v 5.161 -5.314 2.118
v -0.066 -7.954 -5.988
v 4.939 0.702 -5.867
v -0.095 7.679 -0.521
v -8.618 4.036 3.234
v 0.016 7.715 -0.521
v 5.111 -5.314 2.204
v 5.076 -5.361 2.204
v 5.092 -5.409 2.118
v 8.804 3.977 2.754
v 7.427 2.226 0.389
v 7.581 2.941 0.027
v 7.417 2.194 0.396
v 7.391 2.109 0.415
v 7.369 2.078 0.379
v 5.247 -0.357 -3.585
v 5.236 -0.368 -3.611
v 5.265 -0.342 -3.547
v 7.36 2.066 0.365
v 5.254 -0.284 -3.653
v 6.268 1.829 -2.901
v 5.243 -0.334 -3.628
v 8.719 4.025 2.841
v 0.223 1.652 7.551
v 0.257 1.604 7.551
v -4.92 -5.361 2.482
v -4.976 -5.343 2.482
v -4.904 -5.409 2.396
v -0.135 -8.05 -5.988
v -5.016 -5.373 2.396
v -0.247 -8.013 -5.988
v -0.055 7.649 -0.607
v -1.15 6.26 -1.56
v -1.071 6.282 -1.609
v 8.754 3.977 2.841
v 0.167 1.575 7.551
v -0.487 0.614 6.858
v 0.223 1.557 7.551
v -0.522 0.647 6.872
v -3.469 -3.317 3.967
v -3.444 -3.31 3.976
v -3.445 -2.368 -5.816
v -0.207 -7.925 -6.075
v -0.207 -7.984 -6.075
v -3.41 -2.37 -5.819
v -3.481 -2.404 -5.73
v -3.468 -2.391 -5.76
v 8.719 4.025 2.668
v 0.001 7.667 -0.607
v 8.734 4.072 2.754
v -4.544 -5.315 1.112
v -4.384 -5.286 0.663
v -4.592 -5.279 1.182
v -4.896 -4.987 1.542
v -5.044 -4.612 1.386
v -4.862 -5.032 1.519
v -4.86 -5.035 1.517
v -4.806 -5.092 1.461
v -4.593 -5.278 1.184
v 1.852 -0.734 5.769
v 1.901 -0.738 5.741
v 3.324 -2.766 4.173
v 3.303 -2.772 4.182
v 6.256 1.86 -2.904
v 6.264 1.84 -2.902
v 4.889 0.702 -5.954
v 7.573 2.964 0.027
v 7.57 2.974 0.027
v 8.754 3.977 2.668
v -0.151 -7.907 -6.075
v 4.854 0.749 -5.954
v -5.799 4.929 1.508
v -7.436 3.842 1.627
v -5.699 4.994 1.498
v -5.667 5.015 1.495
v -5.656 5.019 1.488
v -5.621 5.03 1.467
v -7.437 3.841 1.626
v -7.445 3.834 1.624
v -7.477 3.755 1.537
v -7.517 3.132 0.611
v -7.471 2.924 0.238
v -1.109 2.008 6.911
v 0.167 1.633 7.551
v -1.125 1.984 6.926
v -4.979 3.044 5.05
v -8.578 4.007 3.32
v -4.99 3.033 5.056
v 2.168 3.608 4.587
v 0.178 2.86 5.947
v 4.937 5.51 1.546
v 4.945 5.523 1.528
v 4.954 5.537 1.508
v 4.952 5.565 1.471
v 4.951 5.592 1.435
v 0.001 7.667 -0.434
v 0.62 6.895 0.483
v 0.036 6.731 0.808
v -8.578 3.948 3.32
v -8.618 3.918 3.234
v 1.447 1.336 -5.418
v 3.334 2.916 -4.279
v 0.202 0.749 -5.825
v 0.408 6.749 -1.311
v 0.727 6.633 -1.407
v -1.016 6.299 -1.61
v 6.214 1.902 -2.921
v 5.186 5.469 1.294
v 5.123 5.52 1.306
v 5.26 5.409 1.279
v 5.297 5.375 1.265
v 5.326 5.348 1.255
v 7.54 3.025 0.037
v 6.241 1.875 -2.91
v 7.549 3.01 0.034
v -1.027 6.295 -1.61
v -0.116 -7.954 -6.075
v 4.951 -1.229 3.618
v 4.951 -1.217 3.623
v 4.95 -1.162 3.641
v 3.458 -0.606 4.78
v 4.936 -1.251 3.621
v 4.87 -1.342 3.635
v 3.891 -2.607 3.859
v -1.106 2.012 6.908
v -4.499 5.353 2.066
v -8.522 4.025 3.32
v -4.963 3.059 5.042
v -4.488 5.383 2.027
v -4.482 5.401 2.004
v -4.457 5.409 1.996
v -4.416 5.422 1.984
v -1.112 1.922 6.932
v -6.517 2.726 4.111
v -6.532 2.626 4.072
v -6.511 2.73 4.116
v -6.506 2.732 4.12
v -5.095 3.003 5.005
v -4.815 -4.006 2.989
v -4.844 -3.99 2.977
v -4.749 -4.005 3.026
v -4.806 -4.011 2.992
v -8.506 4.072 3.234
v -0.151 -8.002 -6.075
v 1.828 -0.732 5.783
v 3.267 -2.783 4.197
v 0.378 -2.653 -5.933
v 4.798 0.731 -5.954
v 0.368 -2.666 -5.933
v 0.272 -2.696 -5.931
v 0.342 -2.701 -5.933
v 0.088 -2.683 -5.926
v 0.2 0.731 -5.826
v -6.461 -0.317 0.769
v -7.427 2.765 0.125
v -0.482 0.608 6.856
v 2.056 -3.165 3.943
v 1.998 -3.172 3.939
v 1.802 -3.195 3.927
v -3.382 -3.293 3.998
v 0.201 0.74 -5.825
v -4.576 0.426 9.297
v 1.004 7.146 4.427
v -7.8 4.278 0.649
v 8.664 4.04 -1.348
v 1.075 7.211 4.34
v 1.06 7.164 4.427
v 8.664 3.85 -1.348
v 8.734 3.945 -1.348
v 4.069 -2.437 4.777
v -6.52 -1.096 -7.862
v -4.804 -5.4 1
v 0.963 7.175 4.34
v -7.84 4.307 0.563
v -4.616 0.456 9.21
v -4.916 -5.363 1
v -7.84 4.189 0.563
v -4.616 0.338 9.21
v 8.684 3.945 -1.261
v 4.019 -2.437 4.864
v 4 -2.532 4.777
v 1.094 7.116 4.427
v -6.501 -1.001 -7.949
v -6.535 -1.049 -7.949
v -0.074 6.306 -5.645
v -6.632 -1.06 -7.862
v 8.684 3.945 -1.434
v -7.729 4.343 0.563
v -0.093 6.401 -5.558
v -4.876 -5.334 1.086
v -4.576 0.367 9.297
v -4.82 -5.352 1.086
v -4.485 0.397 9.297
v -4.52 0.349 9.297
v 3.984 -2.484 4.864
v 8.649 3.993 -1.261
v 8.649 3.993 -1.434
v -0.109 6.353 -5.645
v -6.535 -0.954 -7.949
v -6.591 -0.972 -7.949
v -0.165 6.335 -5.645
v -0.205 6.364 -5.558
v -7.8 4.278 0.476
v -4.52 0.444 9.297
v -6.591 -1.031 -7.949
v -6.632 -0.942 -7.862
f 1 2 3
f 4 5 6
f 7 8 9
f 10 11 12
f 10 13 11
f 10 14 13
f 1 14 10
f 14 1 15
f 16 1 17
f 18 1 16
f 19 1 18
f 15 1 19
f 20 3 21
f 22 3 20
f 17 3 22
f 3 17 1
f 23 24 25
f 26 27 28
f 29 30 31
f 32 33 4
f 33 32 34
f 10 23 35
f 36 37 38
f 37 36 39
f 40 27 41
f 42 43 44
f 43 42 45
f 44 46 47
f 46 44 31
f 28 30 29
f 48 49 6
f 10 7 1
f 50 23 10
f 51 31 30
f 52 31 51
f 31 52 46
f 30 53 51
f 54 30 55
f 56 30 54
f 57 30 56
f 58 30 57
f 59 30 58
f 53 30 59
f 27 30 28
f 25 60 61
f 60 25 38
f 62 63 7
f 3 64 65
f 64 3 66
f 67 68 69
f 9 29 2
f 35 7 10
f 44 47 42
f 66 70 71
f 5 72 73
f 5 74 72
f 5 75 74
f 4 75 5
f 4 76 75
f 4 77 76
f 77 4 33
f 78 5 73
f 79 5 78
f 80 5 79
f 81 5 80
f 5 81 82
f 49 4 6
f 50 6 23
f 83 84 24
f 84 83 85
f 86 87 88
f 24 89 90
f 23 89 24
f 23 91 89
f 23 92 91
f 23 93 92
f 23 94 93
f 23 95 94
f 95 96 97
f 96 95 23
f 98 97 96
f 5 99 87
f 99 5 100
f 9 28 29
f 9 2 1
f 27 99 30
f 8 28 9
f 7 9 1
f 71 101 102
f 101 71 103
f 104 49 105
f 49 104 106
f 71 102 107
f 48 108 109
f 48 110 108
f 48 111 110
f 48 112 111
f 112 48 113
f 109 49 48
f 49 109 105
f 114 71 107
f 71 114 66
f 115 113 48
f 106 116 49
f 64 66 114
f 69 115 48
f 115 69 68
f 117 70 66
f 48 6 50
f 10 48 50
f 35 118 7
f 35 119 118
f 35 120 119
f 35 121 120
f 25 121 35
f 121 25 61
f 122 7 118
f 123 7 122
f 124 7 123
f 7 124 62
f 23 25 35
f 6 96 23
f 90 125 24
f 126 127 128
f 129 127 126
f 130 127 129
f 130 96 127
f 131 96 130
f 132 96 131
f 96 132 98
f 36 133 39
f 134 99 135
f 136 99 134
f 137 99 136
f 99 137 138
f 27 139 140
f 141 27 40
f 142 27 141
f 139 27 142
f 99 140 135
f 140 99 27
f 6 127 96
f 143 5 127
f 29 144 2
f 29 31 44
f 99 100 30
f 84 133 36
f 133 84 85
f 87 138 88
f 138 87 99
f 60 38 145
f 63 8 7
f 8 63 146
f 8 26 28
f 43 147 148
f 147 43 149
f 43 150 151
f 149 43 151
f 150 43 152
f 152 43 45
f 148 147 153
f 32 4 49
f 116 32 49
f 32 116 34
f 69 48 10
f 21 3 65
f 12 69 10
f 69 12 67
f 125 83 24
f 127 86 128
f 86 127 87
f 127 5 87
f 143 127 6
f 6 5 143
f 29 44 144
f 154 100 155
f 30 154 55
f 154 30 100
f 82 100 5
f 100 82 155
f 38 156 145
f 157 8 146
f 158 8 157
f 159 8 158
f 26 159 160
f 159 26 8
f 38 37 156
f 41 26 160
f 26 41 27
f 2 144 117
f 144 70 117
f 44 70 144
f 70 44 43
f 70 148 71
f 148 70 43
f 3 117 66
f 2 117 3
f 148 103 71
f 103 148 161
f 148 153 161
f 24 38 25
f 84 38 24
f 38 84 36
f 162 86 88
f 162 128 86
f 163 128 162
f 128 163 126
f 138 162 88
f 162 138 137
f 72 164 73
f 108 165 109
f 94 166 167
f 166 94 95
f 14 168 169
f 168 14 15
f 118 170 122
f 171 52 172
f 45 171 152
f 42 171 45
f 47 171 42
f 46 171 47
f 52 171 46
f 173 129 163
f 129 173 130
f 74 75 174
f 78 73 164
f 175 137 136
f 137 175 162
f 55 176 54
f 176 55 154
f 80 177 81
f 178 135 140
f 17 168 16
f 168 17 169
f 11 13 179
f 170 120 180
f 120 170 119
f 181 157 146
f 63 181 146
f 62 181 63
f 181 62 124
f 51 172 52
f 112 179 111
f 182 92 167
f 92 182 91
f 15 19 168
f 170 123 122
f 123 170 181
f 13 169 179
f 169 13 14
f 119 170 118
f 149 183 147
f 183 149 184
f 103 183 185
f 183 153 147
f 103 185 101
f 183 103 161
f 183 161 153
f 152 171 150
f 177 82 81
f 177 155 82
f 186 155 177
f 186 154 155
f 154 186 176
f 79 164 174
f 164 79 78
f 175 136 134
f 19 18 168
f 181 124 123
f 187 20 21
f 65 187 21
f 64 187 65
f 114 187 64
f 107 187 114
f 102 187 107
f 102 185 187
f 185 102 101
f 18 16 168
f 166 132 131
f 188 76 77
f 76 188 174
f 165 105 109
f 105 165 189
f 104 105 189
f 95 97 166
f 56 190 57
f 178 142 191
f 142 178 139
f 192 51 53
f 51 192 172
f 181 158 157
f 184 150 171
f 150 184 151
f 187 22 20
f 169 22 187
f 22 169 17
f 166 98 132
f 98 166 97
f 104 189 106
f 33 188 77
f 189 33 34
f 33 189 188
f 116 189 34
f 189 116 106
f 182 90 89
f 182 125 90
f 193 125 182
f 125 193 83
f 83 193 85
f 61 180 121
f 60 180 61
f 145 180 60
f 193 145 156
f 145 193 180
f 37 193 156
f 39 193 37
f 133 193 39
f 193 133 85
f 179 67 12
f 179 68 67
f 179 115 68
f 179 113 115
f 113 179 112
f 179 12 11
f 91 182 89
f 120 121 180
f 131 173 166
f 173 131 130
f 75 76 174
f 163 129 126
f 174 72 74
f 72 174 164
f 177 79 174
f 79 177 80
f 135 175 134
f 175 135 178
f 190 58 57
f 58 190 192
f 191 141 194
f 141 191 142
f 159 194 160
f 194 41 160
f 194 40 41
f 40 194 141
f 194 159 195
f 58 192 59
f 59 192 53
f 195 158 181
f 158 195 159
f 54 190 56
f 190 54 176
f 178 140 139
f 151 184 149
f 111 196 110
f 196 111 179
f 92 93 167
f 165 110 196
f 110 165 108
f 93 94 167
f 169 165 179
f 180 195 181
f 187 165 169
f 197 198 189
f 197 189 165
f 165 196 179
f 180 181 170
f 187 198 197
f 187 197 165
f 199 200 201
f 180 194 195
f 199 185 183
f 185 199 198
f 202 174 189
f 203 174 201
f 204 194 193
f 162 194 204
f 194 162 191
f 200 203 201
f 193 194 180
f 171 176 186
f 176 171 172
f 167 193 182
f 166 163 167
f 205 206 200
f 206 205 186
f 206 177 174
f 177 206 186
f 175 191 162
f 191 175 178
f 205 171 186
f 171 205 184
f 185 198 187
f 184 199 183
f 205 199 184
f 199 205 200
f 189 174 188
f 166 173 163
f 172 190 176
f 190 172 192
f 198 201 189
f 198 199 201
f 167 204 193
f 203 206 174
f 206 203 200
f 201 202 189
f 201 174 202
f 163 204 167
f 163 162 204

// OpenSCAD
// Auto-generated OpenSCAD file

    inner_points = 10*[[0.3968794289832836, -0.24366904809970863, 0.47769744652866364], [0.1044370337410087, 0.7116152041618212, 0.43400027446809336], [0.28001866757022104, -0.32472141302800633, -0.512137931997225], [-0.012423727672053866, 0.6305628392335235, -0.5558351040577953], [-0.483509439683674, -0.5304611105401444, 0.0999862435594168], [-0.7759518349259489, 0.4248231417213853, 0.05628907149884649], [-0.45353704140965617, 0.039673656440986374, 0.9209905083602004], [-0.6550920403237519, -0.10012099428325462, -0.7862229842742783], [0.8633541457398265, 0.39452214456670354, -0.13476752408592219]];

    outer_points = 10*[[0.5060778848187576, -0.5313859144211572, 0.21177232535318735], [0.4838884138968741, 0.07018910183659147, -0.5867357379715961], [-0.4935362337764729, -0.5313859144211572, 0.2395502645330591], [-0.5157257046983563, 0.07018910183659147, -0.5589577987917242], [0.020742555340540487, 0.1604093044556914, 0.7464395051009286], [-0.0014469155813429608, 0.76198432071344, -0.05206855822385477], [0.8703596761375976, 0.39772341860368887, 0.275448253298233], [-0.8537196482801497, 0.39772341860368887, 0.3233581114365443], [-0.016640027857447785, -0.7954468372073777, -0.5988063647347773]];

    // Convex hull for inner set (I)
    module inner_hull() {
        hull() {
            for (p = inner_points) {
                translate(p) sphere(r=0.1);
            }
        }
    }

    // Convex hull for outer set (O) minus inner hull (O \ I)
    module outer_minus_inner() {
        difference() {
            hull() {
                for (p = outer_points) {
                    translate(p) sphere(r=0.1);
                }
            }
            inner_hull(); // Subtract inner hull
        }
    }

    // Convex hull for outer set (O) minus all translated inner hulls
    module outer_minus_AllTranslationInner() {
        difference() {
            hull() {
                for (p = outer_points) {
                    translate(p) sphere(r=0.1);
                }
            }
            hull() {
                translate([0,0,50]) inner_hull();
                translate([0,0,-50]) inner_hull();
            }; // Subtract translated inner hulls
        }
    }

    // Difference between outer_minus_inner and outer_minus_AllTranslationInner
    module outer_minus_inner_diff() {
        difference() {
            // Outer minus inner
            difference() {
                hull() {
                    for (p = outer_points) {
                        translate(p) sphere(r=0.1);
                    }
                }
                inner_hull();
            }

            // Subtract Outer minus AllTranslationInner
            difference() {
                hull() {
                    for (p = outer_points) {
                        translate(p) sphere(r=0.1);
                    }
                }
                hull() {
                    translate([0,0,50]) inner_hull();
                    translate([0,0,-50]) inner_hull();
                };
            }
        }
    }

    // Rendering all with colors applied
    color([1, 0, 0, 0.5]) inner_hull(); // Transparent red
    color([0, 1, 0, 1]) outer_minus_AllTranslationInner(); // Opaque green
    color([1, 1, 0, 1]) outer_minus_inner_diff(); // Opaque yellow
    
